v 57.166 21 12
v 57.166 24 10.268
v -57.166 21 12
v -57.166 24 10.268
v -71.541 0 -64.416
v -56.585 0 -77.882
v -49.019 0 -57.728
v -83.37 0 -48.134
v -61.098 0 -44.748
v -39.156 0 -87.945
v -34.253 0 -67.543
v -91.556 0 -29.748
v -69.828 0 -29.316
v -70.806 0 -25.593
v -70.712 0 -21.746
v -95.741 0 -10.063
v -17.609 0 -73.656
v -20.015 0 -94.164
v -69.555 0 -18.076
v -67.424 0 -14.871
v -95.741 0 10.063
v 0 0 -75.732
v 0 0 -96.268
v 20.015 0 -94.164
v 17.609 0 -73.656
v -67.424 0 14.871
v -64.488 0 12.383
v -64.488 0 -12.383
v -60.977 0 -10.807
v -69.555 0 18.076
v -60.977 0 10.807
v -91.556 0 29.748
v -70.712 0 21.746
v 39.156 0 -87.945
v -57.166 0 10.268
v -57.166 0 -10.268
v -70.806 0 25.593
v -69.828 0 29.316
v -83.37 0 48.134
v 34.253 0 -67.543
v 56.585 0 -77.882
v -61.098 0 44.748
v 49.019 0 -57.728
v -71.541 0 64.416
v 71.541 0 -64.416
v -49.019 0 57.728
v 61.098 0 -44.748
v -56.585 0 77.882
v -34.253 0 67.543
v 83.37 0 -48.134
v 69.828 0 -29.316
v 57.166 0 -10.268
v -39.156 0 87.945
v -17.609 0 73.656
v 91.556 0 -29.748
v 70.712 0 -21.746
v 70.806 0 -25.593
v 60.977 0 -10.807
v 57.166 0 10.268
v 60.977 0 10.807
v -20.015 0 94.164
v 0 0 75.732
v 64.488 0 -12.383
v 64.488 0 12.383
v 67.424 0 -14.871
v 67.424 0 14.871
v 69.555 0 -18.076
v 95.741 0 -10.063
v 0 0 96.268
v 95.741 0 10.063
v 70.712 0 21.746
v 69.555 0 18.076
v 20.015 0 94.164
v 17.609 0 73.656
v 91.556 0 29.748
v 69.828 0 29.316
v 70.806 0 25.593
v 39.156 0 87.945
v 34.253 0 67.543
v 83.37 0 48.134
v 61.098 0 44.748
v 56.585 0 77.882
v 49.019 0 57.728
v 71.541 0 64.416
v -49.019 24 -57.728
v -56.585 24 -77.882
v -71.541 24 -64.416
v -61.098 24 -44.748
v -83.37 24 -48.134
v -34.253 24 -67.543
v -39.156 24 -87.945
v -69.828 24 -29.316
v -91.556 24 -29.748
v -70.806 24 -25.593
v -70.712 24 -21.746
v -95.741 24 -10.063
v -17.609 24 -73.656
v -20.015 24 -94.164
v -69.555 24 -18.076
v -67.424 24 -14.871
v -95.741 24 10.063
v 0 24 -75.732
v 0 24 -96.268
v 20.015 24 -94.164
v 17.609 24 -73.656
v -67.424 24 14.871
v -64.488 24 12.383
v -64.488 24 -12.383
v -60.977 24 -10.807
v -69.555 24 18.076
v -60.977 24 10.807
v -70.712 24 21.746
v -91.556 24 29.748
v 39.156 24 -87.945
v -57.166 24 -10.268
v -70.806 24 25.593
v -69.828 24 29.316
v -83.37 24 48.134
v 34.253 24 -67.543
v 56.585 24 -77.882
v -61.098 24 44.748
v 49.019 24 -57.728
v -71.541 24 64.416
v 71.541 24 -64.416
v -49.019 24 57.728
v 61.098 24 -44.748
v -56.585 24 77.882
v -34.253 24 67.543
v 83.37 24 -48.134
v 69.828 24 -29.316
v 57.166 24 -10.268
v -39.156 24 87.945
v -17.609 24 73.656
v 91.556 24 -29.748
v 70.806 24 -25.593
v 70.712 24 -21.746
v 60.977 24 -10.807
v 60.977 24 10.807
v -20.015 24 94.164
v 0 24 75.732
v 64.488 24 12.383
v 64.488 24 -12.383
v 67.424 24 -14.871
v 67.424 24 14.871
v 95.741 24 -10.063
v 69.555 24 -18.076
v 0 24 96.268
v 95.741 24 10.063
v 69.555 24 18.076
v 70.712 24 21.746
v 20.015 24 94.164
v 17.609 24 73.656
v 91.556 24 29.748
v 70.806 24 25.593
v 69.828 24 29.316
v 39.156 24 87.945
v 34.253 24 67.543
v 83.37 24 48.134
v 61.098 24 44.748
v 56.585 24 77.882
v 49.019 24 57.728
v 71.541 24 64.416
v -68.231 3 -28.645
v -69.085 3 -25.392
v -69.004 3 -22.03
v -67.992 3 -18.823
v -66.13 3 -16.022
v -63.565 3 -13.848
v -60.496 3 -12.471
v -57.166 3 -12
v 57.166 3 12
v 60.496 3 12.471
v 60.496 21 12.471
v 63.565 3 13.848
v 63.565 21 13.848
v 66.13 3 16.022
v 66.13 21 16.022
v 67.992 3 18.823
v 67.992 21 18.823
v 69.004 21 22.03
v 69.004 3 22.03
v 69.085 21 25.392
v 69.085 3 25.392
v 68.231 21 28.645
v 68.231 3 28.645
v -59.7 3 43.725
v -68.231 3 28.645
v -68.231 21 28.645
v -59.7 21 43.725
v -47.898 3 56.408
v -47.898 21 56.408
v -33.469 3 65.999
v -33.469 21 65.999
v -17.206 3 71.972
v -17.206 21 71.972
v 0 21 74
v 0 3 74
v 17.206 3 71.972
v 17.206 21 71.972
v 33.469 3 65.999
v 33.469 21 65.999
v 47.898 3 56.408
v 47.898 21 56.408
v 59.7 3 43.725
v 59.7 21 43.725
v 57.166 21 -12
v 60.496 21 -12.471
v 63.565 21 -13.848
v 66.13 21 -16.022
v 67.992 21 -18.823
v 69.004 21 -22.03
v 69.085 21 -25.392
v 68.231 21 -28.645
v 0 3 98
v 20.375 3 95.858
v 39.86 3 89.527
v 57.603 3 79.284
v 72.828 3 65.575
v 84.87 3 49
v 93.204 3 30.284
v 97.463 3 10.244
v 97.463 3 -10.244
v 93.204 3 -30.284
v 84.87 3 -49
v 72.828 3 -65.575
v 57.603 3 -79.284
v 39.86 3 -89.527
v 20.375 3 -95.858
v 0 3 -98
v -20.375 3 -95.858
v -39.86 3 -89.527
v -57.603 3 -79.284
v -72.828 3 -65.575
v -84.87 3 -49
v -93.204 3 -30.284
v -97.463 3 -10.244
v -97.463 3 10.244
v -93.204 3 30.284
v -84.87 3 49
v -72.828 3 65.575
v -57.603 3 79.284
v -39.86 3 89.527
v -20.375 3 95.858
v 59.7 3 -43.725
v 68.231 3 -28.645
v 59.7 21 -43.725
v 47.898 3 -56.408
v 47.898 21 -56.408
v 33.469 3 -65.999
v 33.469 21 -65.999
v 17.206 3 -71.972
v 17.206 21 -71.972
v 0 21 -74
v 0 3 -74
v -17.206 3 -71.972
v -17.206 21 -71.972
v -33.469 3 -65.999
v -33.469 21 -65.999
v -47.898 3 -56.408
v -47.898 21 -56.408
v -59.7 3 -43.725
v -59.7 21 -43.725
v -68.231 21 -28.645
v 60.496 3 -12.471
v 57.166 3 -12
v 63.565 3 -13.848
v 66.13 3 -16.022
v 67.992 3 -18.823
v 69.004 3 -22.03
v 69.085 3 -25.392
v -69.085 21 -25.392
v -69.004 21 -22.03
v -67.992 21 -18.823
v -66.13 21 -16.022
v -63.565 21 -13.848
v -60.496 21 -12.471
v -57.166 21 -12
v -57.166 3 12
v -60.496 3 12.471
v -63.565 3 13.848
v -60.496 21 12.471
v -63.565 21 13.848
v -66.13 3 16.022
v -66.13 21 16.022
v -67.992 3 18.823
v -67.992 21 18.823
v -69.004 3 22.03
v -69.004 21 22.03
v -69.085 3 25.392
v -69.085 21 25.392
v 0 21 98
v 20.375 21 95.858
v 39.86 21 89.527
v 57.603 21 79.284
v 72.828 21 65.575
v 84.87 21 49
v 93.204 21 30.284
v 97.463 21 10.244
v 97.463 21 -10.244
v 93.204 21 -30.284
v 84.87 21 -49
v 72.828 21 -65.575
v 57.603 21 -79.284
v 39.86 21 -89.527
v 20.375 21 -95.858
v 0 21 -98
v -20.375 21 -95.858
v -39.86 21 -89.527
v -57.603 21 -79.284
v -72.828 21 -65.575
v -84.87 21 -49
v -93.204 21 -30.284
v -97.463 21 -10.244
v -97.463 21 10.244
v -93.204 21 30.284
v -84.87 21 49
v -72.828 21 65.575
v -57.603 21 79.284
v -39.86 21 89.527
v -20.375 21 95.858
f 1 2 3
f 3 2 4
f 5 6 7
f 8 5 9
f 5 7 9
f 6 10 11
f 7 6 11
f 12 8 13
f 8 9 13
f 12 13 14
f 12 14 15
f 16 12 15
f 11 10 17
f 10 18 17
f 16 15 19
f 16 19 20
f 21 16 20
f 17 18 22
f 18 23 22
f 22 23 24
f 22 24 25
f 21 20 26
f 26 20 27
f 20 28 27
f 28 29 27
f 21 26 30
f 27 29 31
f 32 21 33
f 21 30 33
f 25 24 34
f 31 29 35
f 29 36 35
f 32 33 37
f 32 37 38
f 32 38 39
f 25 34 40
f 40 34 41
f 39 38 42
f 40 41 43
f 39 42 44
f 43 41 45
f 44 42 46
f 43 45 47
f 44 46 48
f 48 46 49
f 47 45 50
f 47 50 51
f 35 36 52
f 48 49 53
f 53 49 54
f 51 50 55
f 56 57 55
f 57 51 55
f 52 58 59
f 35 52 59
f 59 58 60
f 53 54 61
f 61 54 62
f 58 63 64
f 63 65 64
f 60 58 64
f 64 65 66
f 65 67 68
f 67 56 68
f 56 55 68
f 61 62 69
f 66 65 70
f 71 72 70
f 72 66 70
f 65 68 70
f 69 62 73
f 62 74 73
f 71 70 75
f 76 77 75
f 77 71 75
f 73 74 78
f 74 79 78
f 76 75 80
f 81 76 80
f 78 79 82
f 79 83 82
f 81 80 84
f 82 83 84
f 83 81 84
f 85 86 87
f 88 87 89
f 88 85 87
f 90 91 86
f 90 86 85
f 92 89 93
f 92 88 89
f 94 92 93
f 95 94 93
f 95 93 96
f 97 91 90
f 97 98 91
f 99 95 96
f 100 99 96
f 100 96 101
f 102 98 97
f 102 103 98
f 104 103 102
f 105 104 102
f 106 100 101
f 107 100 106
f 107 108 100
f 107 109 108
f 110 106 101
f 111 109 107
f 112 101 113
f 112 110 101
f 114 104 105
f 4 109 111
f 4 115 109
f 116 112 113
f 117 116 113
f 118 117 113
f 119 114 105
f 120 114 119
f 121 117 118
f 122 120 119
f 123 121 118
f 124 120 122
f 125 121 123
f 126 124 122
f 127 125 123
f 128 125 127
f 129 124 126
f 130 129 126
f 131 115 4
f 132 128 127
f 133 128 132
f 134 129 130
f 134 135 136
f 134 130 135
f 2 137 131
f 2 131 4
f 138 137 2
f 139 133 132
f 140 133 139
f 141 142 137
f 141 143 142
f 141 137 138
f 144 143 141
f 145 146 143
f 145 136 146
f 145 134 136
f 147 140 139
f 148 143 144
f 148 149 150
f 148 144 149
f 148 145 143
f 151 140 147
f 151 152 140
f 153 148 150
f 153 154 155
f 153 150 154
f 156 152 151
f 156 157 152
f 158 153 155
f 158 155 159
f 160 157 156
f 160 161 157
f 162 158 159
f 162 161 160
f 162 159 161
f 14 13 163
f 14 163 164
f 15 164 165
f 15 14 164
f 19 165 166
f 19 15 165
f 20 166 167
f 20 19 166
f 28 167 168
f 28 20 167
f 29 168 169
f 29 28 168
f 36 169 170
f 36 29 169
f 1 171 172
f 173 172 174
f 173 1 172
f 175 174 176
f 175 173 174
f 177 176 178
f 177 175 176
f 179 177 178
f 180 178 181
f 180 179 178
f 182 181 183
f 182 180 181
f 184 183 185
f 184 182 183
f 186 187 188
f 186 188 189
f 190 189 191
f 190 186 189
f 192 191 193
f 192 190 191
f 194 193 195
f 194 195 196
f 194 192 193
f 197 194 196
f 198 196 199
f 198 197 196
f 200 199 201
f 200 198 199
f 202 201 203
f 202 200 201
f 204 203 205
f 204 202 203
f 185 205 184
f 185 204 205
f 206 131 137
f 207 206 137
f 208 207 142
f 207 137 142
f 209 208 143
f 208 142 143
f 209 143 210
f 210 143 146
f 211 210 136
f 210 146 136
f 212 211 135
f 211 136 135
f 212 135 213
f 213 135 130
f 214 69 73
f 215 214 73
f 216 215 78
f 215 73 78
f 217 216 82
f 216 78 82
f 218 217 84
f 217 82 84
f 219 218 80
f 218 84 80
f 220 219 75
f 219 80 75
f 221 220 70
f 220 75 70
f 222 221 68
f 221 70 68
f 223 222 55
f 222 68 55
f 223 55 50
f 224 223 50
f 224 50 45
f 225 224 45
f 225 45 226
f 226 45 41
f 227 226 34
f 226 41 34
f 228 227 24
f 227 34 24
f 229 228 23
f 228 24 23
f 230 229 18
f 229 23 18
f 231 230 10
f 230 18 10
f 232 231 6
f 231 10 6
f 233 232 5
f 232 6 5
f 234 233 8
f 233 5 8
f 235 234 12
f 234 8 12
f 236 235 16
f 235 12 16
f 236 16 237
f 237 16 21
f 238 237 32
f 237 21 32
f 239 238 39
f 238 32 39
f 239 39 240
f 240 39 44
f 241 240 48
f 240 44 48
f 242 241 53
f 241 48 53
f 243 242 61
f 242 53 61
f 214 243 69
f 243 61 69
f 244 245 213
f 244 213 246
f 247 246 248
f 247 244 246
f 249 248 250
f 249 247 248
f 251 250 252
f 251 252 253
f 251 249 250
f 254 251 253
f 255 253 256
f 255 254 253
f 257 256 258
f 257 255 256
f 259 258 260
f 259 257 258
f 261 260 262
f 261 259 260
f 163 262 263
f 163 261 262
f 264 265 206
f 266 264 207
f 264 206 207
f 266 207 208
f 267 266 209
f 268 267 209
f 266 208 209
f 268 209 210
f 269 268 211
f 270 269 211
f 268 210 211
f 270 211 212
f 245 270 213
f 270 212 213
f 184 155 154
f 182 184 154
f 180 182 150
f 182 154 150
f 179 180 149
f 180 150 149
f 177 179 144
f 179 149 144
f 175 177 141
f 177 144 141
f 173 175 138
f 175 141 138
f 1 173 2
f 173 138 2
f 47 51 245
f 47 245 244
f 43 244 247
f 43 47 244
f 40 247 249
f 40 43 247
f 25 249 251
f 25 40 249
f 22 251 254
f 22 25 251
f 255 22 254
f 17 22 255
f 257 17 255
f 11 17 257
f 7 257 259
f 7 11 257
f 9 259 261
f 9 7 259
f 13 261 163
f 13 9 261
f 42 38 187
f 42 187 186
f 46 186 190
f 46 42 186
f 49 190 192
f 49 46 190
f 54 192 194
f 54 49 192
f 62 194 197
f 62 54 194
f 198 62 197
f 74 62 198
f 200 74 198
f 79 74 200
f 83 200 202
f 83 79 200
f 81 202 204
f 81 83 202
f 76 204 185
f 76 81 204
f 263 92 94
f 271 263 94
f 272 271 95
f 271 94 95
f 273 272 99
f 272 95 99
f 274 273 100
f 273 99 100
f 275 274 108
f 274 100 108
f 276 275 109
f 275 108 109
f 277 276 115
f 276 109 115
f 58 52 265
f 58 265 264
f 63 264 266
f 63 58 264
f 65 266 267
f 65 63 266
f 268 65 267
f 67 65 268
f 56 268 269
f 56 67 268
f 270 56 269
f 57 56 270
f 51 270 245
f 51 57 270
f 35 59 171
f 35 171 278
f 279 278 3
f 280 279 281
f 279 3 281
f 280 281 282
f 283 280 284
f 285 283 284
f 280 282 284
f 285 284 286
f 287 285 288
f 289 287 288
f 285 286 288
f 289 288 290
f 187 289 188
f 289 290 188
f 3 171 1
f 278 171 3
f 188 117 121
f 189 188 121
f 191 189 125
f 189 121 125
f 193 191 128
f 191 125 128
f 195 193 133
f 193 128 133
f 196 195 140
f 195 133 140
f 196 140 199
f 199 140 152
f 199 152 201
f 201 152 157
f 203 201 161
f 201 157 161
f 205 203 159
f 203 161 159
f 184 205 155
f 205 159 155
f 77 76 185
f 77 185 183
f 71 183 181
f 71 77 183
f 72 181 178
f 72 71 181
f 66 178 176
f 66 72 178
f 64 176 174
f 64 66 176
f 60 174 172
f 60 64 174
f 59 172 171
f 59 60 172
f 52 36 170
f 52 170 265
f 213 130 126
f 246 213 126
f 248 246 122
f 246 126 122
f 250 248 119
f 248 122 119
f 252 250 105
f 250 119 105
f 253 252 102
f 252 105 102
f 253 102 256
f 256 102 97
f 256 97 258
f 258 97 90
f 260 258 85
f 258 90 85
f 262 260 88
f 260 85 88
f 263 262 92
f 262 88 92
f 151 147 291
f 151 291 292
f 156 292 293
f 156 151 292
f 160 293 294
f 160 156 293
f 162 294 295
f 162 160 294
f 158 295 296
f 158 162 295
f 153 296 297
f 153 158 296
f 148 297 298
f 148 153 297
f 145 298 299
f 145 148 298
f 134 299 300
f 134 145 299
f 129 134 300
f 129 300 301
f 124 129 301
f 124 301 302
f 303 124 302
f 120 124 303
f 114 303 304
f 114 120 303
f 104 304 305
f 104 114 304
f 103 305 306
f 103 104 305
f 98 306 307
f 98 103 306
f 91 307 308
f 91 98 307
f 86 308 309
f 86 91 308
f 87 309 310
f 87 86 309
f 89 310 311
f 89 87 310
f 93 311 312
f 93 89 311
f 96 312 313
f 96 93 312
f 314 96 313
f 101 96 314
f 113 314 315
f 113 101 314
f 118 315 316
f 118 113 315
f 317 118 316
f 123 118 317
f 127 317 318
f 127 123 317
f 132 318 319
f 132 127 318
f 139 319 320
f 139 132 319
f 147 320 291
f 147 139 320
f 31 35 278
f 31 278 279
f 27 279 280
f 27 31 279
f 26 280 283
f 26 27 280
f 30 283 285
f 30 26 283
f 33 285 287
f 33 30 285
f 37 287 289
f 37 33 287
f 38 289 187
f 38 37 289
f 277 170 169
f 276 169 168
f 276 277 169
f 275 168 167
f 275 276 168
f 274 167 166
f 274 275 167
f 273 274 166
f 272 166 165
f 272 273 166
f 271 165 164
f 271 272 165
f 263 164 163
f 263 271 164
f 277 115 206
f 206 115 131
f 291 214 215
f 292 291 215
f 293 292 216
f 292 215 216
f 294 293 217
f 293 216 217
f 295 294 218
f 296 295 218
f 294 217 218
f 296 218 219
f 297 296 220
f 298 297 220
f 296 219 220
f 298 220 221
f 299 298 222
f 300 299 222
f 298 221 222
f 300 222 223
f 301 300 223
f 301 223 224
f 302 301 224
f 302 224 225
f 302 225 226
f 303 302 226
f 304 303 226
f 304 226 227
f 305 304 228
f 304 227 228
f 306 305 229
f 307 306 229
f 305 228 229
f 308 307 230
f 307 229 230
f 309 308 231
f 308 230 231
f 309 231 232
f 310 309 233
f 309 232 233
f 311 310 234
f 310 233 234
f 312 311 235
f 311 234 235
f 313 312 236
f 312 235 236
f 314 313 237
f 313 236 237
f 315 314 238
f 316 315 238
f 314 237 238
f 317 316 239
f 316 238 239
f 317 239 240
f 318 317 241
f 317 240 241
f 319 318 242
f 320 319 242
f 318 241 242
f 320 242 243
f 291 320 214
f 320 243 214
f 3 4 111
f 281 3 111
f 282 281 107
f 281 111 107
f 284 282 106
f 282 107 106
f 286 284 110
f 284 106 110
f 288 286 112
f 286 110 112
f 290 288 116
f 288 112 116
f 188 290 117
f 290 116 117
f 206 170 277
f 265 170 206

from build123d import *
from OCP.BRepFilletAPI import BRepFilletAPI_MakeChamfer

# Parameters (mm, degrees)
SKETCH1_R           = 98
BOSS_EXTRUDE1_DEPTH = 24
FILLET1_R           = 12
CHAMFER1_SIZE       = 3
CHAMFER1_SIZE2      = 1.732050808
CHAMFER2_SIZE       = 3
CHAMFER2_SIZE2      = 1.732050808


with BuildPart() as part:
    # Sketch1 → Boss-Extrude1 (new body)
    with BuildSketch(Plane(origin=(0, 0, 0), x_dir=(1, 0, 0), z_dir=(0, 1, 0))):
        with Locations(Location((0, 0, 0), (0, 0, 270))):
            Circle(SKETCH1_R)
        with BuildLine():
            Line((-73.020545054, 12), (73.020545054, 12))
            ThreePointArc((73.020545054, 12), (0, 74), (-73.020545054, 12))
        make_face(mode=Mode.SUBTRACT)
        with BuildLine():
            Line((73.020545054, -12), (-73.020545054, -12))
            ThreePointArc((-73.020545054, -12), (0, -74), (73.020545054, -12))
        make_face(mode=Mode.SUBTRACT)
    extrude(amount=BOSS_EXTRUDE1_DEPTH)

    # Fillet1
    fillet1_edges = [part.edges().sort_by_distance(p)[0] for p in [
        (-73.020545054, 12, 12),
        (73.020545054, 12, 12),
        (73.020545054, 12, -12),
        (-73.020545054, 12, -12),
    ]]
    fillet(fillet1_edges, radius=FILLET1_R)

    # Chamfer1: one chamfer whose edges measure the first distance from different faces: ONE call of the kernel's chamfer builder (chamfer() names one face for all edges)
    chamfer1_edges_1 = [part.edges().sort_by_distance(p)[0] for p in [
        (0, 0, 74),
    ]]
    chamfer1_side_1 = [part.faces().sort_by_distance(p)[0] for p in [
        (0, 12, 74),
    ]]
    chamfer1_edges_2 = [part.edges().sort_by_distance(p)[0] for p in [
        (0, 0, 12),
    ]]
    chamfer1_side_2 = [part.faces().sort_by_distance(p)[0] for p in [
        (0, 12, 12),
    ]]
    chamfer1_edges_3 = [part.edges().sort_by_distance(p)[0] for p in [
        (0, 0, -12),
    ]]
    chamfer1_side_3 = [part.faces().sort_by_distance(p)[0] for p in [
        (0, 12, -12),
    ]]
    chamfer1_edges_4 = [part.edges().sort_by_distance(p)[0] for p in [
        (0, 0, -74),
    ]]
    chamfer1_side_4 = [part.faces().sort_by_distance(p)[0] for p in [
        (0, 12, -74),
    ]]
    chamfer1_edges_5 = [part.edges().sort_by_distance(p)[0] for p in [
        (67.159970016, 0, 17.357031367),
    ]]
    chamfer1_side_5 = [part.faces().sort_by_distance(p)[0] for p in [
        (67.159970016, 12, 17.357031367),
    ]]
    chamfer1_edges_6 = [part.edges().sort_by_distance(p)[0] for p in [
        (67.159970016, 0, -17.357031367),
    ]]
    chamfer1_side_6 = [part.faces().sort_by_distance(p)[0] for p in [
        (67.159970016, 12, -17.357031367),
    ]]
    chamfer1_edges_7 = [part.edges().sort_by_distance(p)[0] for p in [
        (-67.159970016, 0, -17.357031367),
    ]]
    chamfer1_side_7 = [part.faces().sort_by_distance(p)[0] for p in [
        (-67.159970016, 12, -17.357031367),
    ]]
    chamfer1_edges_8 = [part.edges().sort_by_distance(p)[0] for p in [
        (-67.159970016, 0, 17.357031367),
    ]]
    chamfer1_side_8 = [part.faces().sort_by_distance(p)[0] for p in [
        (-67.159970016, 12, 17.357031367),
    ]]
    chamfer1_edges_9 = [part.edges().sort_by_distance(p)[0] for p in [
        (0, 24, -98),
    ]]
    chamfer1_side_9 = [part.faces().sort_by_distance(p)[0] for p in [
        (0, 12, -98),
    ]]
    chamfer1 = BRepFilletAPI_MakeChamfer(part.part.solid().wrapped)
    for e in chamfer1_edges_1:
        chamfer1.Add(CHAMFER1_SIZE, CHAMFER1_SIZE2, e.wrapped, chamfer1_side_1[0].wrapped)  # the first distance lies on this face
    for e in chamfer1_edges_2:
        chamfer1.Add(CHAMFER1_SIZE, CHAMFER1_SIZE2, e.wrapped, chamfer1_side_2[0].wrapped)  # the first distance lies on this face
    for e in chamfer1_edges_3:
        chamfer1.Add(CHAMFER1_SIZE, CHAMFER1_SIZE2, e.wrapped, chamfer1_side_3[0].wrapped)  # the first distance lies on this face
    for e in chamfer1_edges_4:
        chamfer1.Add(CHAMFER1_SIZE, CHAMFER1_SIZE2, e.wrapped, chamfer1_side_4[0].wrapped)  # the first distance lies on this face
    for e in chamfer1_edges_5:
        chamfer1.Add(CHAMFER1_SIZE, CHAMFER1_SIZE2, e.wrapped, chamfer1_side_5[0].wrapped)  # the first distance lies on this face
    for e in chamfer1_edges_6:
        chamfer1.Add(CHAMFER1_SIZE, CHAMFER1_SIZE2, e.wrapped, chamfer1_side_6[0].wrapped)  # the first distance lies on this face
    for e in chamfer1_edges_7:
        chamfer1.Add(CHAMFER1_SIZE, CHAMFER1_SIZE2, e.wrapped, chamfer1_side_7[0].wrapped)  # the first distance lies on this face
    for e in chamfer1_edges_8:
        chamfer1.Add(CHAMFER1_SIZE, CHAMFER1_SIZE2, e.wrapped, chamfer1_side_8[0].wrapped)  # the first distance lies on this face
    for e in chamfer1_edges_9:
        chamfer1.Add(CHAMFER1_SIZE, CHAMFER1_SIZE2, e.wrapped, chamfer1_side_9[0].wrapped)  # the first distance lies on this face
    add(Compound.cast(chamfer1.Shape()), mode=Mode.REPLACE)

    # Chamfer2: one chamfer whose edges measure the first distance from different faces: ONE call of the kernel's chamfer builder (chamfer() names one face for all edges)
    chamfer2_edges_1 = [part.edges().sort_by_distance(p)[0] for p in [
        (0, 0, -98),
    ]]
    chamfer2_side_1 = [part.faces().sort_by_distance(p)[0] for p in [
        (0, 10.5, -98),
    ]]
    chamfer2_edges_2 = [part.edges().sort_by_distance(p)[0] for p in [
        (0, 24, 74),
    ]]
    chamfer2_side_2 = [part.faces().sort_by_distance(p)[0] for p in [
        (0, 13.5, 74),
    ]]
    chamfer2_edges_3 = [part.edges().sort_by_distance(p)[0] for p in [
        (0, 24, 12),
    ]]
    chamfer2_side_3 = [part.faces().sort_by_distance(p)[0] for p in [
        (0, 13.5, 12),
    ]]
    chamfer2_edges_4 = [part.edges().sort_by_distance(p)[0] for p in [
        (0, 24, -12),
    ]]
    chamfer2_side_4 = [part.faces().sort_by_distance(p)[0] for p in [
        (0, 13.5, -12),
    ]]
    chamfer2_edges_5 = [part.edges().sort_by_distance(p)[0] for p in [
        (0, 24, -74),
    ]]
    chamfer2_side_5 = [part.faces().sort_by_distance(p)[0] for p in [
        (0, 13.5, -74),
    ]]
    chamfer2_edges_6 = [part.edges().sort_by_distance(p)[0] for p in [
        (67.159970016, 24, 17.357031367),
    ]]
    chamfer2_side_6 = [part.faces().sort_by_distance(p)[0] for p in [
        (67.159970016, 13.5, 17.357031367),
    ]]
    chamfer2_edges_7 = [part.edges().sort_by_distance(p)[0] for p in [
        (67.159970016, 24, -17.357031367),
    ]]
    chamfer2_side_7 = [part.faces().sort_by_distance(p)[0] for p in [
        (67.159970016, 13.5, -17.357031367),
    ]]
    chamfer2_edges_8 = [part.edges().sort_by_distance(p)[0] for p in [
        (-67.159970016, 24, -17.357031367),
    ]]
    chamfer2_side_8 = [part.faces().sort_by_distance(p)[0] for p in [
        (-67.159970016, 13.5, -17.357031367),
    ]]
    chamfer2_edges_9 = [part.edges().sort_by_distance(p)[0] for p in [
        (-67.159970016, 24, 17.357031367),
    ]]
    chamfer2_side_9 = [part.faces().sort_by_distance(p)[0] for p in [
        (-67.159970016, 13.5, 17.357031367),
    ]]
    chamfer2 = BRepFilletAPI_MakeChamfer(part.part.solid().wrapped)
    for e in chamfer2_edges_1:
        chamfer2.Add(CHAMFER2_SIZE, CHAMFER2_SIZE2, e.wrapped, chamfer2_side_1[0].wrapped)  # the first distance lies on this face
    for e in chamfer2_edges_2:
        chamfer2.Add(CHAMFER2_SIZE, CHAMFER2_SIZE2, e.wrapped, chamfer2_side_2[0].wrapped)  # the first distance lies on this face
    for e in chamfer2_edges_3:
        chamfer2.Add(CHAMFER2_SIZE, CHAMFER2_SIZE2, e.wrapped, chamfer2_side_3[0].wrapped)  # the first distance lies on this face
    for e in chamfer2_edges_4:
        chamfer2.Add(CHAMFER2_SIZE, CHAMFER2_SIZE2, e.wrapped, chamfer2_side_4[0].wrapped)  # the first distance lies on this face
    for e in chamfer2_edges_5:
        chamfer2.Add(CHAMFER2_SIZE, CHAMFER2_SIZE2, e.wrapped, chamfer2_side_5[0].wrapped)  # the first distance lies on this face
    for e in chamfer2_edges_6:
        chamfer2.Add(CHAMFER2_SIZE, CHAMFER2_SIZE2, e.wrapped, chamfer2_side_6[0].wrapped)  # the first distance lies on this face
    for e in chamfer2_edges_7:
        chamfer2.Add(CHAMFER2_SIZE, CHAMFER2_SIZE2, e.wrapped, chamfer2_side_7[0].wrapped)  # the first distance lies on this face
    for e in chamfer2_edges_8:
        chamfer2.Add(CHAMFER2_SIZE, CHAMFER2_SIZE2, e.wrapped, chamfer2_side_8[0].wrapped)  # the first distance lies on this face
    for e in chamfer2_edges_9:
        chamfer2.Add(CHAMFER2_SIZE, CHAMFER2_SIZE2, e.wrapped, chamfer2_side_9[0].wrapped)  # the first distance lies on this face
    add(Compound.cast(chamfer2.Shape()), mode=Mode.REPLACE)


solid = part.part
